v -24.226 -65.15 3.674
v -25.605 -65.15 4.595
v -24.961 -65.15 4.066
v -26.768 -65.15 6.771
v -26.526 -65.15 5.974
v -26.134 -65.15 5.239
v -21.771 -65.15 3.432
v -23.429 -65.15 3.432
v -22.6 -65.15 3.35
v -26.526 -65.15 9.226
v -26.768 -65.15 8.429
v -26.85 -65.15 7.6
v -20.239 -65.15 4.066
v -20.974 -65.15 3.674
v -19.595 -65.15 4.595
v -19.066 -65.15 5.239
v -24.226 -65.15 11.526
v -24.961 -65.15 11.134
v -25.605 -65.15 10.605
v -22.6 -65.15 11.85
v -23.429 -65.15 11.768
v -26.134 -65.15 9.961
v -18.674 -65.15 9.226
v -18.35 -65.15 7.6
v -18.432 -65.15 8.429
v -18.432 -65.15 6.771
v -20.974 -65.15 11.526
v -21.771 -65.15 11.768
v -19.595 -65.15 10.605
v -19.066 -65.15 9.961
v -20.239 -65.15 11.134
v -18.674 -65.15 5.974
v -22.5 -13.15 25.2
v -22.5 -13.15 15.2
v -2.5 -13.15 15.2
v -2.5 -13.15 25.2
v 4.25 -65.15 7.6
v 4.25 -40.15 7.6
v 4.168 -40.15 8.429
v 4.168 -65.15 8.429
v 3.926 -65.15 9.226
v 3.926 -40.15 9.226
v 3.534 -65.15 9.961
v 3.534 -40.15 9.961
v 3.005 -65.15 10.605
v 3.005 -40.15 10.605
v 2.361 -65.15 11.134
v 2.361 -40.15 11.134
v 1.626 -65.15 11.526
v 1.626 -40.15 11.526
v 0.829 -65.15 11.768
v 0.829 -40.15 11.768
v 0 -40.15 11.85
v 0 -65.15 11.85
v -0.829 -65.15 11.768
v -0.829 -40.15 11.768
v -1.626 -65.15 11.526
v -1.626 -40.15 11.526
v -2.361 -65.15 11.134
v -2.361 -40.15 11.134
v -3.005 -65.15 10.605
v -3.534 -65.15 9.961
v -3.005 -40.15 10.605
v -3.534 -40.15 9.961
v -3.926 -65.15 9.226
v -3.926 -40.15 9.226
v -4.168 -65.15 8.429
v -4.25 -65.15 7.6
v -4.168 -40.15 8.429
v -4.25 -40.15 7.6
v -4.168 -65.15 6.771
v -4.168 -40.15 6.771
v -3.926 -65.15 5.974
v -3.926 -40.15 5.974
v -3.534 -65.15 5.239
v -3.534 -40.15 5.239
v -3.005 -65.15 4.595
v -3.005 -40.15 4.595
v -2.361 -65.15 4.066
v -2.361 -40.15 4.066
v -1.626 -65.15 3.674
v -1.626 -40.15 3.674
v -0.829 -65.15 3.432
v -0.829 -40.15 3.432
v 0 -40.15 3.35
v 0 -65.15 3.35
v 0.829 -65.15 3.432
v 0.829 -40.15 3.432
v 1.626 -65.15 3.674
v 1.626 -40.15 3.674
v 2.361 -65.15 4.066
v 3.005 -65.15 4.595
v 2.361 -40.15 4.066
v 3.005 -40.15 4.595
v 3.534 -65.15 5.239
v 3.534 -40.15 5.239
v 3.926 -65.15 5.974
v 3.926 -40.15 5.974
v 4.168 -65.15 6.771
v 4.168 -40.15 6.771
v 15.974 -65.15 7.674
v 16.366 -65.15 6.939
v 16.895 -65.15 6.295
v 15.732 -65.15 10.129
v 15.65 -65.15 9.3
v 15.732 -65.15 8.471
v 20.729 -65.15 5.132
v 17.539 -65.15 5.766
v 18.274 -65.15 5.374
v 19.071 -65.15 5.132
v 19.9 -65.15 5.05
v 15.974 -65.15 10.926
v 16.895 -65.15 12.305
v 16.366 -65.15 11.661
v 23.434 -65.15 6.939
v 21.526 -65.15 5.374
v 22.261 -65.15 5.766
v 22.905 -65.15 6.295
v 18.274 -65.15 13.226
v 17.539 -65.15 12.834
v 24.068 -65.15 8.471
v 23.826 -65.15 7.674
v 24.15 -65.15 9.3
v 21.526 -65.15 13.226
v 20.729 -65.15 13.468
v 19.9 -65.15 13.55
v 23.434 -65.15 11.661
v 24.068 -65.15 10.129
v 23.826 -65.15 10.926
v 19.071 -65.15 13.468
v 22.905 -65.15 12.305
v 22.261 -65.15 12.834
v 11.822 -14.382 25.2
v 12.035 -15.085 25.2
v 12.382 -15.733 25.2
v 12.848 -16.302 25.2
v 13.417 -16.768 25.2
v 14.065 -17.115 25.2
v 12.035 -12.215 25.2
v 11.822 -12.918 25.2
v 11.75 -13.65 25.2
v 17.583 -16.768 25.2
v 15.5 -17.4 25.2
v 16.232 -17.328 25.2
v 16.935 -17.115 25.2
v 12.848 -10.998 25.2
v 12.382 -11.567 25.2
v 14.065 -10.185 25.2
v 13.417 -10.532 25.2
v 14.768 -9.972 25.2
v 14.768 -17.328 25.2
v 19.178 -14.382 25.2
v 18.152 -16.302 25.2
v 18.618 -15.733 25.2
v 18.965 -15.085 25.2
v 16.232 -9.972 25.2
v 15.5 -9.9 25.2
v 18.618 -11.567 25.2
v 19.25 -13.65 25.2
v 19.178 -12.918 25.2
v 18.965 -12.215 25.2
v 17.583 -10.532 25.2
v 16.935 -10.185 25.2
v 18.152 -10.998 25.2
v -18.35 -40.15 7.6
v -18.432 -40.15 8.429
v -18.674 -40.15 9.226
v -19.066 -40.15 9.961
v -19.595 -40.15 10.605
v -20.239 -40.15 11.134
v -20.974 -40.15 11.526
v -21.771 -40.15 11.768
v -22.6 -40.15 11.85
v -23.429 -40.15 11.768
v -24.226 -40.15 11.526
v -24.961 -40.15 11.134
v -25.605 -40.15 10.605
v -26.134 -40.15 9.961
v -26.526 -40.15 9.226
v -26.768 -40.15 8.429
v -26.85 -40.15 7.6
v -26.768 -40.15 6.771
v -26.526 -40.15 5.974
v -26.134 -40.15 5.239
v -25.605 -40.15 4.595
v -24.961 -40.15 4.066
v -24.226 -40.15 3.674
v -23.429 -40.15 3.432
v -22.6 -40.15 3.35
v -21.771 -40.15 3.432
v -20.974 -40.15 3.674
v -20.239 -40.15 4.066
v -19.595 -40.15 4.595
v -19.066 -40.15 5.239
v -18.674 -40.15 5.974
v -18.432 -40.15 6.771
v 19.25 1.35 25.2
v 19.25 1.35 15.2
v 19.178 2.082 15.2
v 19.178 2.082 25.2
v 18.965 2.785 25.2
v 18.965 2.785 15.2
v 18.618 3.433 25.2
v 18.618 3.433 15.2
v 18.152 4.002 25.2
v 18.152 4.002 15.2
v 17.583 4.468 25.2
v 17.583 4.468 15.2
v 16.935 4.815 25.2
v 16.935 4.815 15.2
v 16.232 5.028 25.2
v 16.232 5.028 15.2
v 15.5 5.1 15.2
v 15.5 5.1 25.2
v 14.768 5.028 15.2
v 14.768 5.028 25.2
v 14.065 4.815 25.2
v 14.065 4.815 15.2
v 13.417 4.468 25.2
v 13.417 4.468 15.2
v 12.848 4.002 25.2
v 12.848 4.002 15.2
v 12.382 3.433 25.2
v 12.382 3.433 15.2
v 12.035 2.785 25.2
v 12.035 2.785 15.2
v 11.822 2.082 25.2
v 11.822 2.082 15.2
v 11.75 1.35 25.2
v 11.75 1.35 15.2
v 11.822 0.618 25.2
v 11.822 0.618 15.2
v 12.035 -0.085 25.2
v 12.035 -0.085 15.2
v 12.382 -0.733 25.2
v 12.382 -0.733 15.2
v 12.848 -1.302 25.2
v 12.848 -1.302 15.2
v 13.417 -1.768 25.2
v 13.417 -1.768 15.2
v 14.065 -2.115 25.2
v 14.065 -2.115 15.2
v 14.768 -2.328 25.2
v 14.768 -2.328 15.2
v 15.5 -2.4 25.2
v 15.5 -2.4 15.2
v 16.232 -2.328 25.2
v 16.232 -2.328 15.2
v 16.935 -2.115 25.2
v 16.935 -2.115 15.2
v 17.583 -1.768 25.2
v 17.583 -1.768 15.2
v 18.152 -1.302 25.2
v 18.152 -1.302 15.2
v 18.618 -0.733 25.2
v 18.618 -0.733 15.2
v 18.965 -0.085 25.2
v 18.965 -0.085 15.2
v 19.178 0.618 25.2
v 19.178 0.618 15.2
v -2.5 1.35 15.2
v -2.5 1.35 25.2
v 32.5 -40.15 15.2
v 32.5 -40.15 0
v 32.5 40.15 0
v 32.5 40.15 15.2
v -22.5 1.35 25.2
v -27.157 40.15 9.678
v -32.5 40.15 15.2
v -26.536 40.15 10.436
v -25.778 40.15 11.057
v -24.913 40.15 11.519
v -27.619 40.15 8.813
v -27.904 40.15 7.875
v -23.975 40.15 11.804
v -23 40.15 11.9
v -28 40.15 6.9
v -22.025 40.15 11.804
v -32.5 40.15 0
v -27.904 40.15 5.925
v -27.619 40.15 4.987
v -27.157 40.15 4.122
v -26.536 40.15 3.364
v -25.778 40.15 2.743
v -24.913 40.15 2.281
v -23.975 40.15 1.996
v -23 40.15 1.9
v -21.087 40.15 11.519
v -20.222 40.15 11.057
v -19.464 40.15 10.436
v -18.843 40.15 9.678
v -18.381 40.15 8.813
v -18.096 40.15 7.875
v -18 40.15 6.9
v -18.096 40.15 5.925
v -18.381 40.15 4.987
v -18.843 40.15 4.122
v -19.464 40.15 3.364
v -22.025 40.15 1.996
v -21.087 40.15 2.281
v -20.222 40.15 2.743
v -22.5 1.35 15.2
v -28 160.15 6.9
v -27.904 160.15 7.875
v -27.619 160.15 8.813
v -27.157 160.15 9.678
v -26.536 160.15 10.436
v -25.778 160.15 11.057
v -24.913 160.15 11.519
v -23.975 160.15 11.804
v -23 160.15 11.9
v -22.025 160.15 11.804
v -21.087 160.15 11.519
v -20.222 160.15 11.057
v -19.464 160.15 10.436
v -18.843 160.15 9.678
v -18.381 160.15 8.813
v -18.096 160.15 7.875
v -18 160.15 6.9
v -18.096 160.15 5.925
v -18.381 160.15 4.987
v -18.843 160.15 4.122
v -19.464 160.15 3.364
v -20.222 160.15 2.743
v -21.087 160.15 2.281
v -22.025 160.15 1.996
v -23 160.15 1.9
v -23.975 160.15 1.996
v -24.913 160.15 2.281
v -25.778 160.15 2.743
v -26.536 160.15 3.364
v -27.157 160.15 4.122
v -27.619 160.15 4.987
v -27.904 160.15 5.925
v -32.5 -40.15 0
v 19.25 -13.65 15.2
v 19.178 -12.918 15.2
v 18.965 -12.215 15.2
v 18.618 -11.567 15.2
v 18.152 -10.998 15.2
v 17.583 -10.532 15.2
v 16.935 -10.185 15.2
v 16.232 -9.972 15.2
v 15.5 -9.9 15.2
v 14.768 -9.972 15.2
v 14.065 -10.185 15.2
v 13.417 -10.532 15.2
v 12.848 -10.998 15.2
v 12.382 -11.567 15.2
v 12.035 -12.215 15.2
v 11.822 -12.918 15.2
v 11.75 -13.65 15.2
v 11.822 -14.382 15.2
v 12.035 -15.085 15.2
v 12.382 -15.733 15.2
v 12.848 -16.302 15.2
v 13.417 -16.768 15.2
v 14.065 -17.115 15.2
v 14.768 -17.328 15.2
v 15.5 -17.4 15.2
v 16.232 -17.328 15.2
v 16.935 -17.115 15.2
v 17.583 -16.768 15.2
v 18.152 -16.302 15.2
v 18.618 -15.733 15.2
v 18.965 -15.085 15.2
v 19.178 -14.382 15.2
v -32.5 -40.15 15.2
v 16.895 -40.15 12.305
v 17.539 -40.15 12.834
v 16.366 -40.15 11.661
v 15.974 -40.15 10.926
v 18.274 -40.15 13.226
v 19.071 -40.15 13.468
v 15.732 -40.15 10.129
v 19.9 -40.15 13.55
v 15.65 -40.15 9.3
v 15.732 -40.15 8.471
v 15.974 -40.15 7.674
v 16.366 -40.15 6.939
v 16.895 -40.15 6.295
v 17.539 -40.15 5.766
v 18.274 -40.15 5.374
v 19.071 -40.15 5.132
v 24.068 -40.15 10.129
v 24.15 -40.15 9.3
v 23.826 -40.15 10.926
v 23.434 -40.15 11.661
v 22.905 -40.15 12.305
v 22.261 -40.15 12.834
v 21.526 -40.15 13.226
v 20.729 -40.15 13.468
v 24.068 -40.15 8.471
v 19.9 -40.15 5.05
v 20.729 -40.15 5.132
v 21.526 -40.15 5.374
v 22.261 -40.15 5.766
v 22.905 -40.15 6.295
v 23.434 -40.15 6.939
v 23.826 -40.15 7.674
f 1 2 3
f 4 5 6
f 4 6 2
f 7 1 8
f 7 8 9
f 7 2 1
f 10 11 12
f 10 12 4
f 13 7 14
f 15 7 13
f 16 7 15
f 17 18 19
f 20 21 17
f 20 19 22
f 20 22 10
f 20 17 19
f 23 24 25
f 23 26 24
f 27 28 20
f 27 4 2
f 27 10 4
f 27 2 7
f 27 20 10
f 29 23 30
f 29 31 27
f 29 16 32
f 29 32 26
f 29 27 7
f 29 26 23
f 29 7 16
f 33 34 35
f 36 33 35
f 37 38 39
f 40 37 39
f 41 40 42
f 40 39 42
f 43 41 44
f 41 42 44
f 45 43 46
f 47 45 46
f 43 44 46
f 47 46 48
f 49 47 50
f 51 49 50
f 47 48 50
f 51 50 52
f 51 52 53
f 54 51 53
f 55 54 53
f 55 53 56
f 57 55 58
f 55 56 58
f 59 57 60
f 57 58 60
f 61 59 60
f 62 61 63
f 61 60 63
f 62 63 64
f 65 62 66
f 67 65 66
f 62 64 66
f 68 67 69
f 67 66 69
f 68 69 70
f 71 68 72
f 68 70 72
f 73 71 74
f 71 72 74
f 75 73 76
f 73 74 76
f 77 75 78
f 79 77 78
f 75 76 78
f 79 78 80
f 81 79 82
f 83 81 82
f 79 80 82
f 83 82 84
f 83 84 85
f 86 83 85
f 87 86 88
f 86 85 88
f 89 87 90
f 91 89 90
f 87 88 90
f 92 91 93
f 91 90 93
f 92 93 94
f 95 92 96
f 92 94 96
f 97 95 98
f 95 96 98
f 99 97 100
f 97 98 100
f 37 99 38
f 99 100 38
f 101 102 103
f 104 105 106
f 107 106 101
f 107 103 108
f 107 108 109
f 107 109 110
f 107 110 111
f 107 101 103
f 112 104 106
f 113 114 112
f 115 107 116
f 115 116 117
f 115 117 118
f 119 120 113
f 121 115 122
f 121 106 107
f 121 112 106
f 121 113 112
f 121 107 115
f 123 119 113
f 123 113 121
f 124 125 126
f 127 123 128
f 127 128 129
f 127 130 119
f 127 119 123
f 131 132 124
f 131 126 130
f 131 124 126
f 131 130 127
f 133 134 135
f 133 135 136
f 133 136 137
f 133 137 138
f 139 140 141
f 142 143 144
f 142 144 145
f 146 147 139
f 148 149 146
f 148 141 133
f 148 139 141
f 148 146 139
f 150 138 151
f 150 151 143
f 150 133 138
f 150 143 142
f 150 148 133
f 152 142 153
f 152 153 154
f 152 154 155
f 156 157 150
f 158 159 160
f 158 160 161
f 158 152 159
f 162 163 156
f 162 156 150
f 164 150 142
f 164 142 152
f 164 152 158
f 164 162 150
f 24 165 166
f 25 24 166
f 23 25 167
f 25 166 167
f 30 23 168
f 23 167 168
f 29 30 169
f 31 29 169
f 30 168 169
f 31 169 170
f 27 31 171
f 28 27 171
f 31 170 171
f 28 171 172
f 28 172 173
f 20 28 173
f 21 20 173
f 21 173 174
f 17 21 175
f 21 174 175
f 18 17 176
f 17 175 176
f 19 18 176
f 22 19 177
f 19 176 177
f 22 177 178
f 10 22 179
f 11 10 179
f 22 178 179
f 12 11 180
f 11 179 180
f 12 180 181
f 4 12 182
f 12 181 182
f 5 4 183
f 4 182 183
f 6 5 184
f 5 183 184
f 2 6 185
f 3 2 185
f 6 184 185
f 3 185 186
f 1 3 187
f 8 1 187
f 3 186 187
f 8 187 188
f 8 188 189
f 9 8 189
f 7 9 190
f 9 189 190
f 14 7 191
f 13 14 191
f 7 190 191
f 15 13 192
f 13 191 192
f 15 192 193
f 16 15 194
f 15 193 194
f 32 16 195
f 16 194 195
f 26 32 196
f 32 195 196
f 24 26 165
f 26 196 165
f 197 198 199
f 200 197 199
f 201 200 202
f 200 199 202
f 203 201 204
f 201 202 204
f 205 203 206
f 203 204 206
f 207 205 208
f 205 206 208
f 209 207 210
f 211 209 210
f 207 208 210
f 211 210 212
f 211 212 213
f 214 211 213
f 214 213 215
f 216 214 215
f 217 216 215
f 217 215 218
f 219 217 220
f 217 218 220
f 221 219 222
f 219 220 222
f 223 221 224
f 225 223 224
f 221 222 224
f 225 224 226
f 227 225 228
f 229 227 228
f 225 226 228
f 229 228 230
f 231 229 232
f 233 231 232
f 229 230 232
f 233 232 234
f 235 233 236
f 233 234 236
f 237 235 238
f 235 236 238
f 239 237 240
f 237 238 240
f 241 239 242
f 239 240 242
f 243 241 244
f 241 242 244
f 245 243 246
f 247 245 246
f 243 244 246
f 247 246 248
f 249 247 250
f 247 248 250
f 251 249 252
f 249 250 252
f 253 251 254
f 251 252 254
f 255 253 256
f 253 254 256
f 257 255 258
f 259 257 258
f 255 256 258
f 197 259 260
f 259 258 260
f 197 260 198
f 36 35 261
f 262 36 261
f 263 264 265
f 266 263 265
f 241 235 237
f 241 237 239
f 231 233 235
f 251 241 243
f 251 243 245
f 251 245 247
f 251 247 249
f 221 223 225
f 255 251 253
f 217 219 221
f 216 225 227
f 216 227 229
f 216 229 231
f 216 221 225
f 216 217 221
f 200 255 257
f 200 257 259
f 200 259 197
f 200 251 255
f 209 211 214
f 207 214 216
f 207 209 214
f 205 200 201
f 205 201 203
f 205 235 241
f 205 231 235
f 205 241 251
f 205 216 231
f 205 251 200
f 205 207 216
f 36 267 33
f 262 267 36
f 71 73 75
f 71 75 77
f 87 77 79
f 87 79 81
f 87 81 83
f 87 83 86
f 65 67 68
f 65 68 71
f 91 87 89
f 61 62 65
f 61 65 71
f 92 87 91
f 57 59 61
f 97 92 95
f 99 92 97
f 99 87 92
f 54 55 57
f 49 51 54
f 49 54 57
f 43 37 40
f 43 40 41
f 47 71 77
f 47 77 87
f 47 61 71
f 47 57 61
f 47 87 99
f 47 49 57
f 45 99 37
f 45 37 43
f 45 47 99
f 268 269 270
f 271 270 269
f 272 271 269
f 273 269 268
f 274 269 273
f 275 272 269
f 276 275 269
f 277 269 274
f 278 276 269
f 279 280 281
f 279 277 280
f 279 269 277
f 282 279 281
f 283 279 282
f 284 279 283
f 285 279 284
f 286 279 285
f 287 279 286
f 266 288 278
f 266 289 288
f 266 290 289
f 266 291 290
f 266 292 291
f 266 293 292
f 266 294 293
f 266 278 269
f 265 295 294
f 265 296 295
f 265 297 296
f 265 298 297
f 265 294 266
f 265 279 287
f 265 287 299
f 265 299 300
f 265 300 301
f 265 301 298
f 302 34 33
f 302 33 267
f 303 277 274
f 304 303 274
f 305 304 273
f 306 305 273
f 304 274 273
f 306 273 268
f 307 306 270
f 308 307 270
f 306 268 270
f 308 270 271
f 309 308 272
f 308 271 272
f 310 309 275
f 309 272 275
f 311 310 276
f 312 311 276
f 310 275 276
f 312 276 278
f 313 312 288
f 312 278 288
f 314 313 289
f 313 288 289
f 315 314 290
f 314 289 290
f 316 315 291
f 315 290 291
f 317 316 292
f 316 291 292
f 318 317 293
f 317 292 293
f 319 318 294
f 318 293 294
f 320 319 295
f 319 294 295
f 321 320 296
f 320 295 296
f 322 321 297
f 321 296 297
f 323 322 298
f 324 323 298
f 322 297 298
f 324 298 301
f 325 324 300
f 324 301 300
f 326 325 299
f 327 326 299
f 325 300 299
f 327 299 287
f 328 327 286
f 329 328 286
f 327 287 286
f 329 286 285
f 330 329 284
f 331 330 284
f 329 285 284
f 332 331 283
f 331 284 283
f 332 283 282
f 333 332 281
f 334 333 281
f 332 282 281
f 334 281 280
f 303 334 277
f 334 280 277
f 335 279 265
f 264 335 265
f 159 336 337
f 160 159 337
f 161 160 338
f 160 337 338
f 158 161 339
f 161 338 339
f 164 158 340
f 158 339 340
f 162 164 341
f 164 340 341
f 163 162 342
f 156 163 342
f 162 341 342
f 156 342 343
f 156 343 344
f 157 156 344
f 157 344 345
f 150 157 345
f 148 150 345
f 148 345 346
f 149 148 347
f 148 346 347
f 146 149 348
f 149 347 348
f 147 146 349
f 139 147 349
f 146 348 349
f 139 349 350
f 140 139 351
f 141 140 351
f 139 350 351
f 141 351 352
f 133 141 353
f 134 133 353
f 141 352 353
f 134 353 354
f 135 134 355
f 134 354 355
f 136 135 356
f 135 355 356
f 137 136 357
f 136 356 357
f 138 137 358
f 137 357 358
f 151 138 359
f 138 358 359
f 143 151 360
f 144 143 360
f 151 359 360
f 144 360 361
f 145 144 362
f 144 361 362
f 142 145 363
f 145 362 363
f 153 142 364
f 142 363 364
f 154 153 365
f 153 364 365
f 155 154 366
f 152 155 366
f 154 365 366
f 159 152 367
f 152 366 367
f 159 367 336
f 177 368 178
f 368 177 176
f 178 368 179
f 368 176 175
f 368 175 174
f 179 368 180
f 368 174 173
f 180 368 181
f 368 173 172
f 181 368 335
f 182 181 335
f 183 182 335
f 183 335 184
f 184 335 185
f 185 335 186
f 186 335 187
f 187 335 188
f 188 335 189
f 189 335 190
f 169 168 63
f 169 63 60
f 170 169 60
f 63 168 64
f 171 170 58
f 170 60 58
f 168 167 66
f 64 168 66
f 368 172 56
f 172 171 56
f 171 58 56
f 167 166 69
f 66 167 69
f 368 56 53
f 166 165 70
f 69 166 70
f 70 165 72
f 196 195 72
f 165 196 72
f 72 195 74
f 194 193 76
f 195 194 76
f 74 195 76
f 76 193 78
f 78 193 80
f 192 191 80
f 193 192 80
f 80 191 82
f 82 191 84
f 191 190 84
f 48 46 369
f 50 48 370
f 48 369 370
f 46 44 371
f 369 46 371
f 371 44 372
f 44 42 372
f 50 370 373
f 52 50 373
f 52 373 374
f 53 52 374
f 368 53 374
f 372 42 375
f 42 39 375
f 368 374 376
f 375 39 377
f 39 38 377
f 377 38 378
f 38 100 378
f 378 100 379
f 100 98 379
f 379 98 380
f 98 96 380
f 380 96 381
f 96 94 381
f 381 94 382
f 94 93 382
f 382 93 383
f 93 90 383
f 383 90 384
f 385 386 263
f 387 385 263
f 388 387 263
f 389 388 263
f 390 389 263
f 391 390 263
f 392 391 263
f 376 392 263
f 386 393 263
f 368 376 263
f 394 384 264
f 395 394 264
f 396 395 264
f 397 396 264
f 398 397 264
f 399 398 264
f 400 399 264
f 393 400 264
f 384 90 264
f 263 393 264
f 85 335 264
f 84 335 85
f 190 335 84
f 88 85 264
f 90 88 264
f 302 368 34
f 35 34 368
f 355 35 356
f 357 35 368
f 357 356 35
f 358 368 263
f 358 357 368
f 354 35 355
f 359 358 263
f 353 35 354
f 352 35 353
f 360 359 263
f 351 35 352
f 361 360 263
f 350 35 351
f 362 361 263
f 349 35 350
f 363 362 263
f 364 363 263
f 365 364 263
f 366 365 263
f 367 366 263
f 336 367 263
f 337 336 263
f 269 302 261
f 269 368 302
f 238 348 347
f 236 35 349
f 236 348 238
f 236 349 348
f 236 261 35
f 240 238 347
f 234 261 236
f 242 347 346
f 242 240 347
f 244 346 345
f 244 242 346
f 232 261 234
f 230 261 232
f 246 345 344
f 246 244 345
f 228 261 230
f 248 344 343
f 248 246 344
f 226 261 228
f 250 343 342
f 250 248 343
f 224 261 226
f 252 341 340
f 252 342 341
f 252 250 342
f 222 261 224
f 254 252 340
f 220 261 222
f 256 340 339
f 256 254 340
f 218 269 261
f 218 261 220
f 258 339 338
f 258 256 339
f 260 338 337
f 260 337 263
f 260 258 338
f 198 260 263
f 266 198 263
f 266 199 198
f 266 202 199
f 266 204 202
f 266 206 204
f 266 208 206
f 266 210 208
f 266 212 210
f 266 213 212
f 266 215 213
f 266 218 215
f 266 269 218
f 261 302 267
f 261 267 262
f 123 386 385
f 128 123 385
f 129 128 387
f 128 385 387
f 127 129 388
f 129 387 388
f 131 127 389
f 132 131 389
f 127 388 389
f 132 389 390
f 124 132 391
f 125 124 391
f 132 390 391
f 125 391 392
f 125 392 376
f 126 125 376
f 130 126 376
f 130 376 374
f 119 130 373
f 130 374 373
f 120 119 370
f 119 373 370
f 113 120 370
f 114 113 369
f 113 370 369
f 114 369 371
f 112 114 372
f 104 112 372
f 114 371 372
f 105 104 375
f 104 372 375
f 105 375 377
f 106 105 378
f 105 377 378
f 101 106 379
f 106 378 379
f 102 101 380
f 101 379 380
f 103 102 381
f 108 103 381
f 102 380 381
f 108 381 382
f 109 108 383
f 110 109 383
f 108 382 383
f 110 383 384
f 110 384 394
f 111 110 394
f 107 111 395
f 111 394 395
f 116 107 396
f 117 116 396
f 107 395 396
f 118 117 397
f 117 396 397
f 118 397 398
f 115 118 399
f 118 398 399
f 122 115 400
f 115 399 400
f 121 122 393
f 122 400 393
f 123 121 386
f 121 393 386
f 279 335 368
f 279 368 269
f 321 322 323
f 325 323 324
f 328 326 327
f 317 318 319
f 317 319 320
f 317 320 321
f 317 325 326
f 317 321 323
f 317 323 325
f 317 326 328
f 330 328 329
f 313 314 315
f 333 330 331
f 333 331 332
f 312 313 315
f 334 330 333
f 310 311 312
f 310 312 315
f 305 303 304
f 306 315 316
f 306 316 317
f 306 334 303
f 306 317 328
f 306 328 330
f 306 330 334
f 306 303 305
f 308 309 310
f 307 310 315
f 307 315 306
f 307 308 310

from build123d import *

# Parameters (mm, degrees)
F0_W     = 65
F0_H     = 80.3
F1_DEPTH = 15.2
F2_R     = 5
F3_DEPTH = 120
F4_R     = 4.25
F5_DEPTH = 25
F6_W     = 20
F6_H     = 14.5
F6_R     = 3.75
F7_DEPTH = 10


with BuildPart() as f1:
    # F0 (on Top) → F1 (new body)
    with BuildSketch(Plane.XY):
        Rectangle(F0_W, F0_H)
    extrude(amount=F1_DEPTH)

    # F2 (on face) → F3 (join)
    with BuildSketch(Plane(origin=(0, 40.15, 0), x_dir=(-1, 0, 0), z_dir=(0, 1, 0))):
        with Locations((23, 6.9)):
            Circle(F2_R)
    extrude(amount=F3_DEPTH)

    # F4 (on face) → F5 (join)
    with BuildSketch(Plane.XZ.offset(40.15)):
        with Locations((-22.6, 7.6)):
            Circle(F4_R)
        with Locations((0, 7.6)):
            Circle(F4_R)
        with Locations((19.9, 9.3)):
            Circle(F4_R)
    extrude(amount=F5_DEPTH)

    # F6 (on face) → F7 (join)
    with BuildSketch(Plane.XY.offset(15.2)):
        with Locations((-12.5, -5.9)):
            Rectangle(F6_W, F6_H)
        with Locations((15.5, 1.35)):
            Circle(F6_R)
        with Locations((15.5, -13.65)):
            Circle(F6_R)
    extrude(amount=F7_DEPTH)


solid = f1.part
